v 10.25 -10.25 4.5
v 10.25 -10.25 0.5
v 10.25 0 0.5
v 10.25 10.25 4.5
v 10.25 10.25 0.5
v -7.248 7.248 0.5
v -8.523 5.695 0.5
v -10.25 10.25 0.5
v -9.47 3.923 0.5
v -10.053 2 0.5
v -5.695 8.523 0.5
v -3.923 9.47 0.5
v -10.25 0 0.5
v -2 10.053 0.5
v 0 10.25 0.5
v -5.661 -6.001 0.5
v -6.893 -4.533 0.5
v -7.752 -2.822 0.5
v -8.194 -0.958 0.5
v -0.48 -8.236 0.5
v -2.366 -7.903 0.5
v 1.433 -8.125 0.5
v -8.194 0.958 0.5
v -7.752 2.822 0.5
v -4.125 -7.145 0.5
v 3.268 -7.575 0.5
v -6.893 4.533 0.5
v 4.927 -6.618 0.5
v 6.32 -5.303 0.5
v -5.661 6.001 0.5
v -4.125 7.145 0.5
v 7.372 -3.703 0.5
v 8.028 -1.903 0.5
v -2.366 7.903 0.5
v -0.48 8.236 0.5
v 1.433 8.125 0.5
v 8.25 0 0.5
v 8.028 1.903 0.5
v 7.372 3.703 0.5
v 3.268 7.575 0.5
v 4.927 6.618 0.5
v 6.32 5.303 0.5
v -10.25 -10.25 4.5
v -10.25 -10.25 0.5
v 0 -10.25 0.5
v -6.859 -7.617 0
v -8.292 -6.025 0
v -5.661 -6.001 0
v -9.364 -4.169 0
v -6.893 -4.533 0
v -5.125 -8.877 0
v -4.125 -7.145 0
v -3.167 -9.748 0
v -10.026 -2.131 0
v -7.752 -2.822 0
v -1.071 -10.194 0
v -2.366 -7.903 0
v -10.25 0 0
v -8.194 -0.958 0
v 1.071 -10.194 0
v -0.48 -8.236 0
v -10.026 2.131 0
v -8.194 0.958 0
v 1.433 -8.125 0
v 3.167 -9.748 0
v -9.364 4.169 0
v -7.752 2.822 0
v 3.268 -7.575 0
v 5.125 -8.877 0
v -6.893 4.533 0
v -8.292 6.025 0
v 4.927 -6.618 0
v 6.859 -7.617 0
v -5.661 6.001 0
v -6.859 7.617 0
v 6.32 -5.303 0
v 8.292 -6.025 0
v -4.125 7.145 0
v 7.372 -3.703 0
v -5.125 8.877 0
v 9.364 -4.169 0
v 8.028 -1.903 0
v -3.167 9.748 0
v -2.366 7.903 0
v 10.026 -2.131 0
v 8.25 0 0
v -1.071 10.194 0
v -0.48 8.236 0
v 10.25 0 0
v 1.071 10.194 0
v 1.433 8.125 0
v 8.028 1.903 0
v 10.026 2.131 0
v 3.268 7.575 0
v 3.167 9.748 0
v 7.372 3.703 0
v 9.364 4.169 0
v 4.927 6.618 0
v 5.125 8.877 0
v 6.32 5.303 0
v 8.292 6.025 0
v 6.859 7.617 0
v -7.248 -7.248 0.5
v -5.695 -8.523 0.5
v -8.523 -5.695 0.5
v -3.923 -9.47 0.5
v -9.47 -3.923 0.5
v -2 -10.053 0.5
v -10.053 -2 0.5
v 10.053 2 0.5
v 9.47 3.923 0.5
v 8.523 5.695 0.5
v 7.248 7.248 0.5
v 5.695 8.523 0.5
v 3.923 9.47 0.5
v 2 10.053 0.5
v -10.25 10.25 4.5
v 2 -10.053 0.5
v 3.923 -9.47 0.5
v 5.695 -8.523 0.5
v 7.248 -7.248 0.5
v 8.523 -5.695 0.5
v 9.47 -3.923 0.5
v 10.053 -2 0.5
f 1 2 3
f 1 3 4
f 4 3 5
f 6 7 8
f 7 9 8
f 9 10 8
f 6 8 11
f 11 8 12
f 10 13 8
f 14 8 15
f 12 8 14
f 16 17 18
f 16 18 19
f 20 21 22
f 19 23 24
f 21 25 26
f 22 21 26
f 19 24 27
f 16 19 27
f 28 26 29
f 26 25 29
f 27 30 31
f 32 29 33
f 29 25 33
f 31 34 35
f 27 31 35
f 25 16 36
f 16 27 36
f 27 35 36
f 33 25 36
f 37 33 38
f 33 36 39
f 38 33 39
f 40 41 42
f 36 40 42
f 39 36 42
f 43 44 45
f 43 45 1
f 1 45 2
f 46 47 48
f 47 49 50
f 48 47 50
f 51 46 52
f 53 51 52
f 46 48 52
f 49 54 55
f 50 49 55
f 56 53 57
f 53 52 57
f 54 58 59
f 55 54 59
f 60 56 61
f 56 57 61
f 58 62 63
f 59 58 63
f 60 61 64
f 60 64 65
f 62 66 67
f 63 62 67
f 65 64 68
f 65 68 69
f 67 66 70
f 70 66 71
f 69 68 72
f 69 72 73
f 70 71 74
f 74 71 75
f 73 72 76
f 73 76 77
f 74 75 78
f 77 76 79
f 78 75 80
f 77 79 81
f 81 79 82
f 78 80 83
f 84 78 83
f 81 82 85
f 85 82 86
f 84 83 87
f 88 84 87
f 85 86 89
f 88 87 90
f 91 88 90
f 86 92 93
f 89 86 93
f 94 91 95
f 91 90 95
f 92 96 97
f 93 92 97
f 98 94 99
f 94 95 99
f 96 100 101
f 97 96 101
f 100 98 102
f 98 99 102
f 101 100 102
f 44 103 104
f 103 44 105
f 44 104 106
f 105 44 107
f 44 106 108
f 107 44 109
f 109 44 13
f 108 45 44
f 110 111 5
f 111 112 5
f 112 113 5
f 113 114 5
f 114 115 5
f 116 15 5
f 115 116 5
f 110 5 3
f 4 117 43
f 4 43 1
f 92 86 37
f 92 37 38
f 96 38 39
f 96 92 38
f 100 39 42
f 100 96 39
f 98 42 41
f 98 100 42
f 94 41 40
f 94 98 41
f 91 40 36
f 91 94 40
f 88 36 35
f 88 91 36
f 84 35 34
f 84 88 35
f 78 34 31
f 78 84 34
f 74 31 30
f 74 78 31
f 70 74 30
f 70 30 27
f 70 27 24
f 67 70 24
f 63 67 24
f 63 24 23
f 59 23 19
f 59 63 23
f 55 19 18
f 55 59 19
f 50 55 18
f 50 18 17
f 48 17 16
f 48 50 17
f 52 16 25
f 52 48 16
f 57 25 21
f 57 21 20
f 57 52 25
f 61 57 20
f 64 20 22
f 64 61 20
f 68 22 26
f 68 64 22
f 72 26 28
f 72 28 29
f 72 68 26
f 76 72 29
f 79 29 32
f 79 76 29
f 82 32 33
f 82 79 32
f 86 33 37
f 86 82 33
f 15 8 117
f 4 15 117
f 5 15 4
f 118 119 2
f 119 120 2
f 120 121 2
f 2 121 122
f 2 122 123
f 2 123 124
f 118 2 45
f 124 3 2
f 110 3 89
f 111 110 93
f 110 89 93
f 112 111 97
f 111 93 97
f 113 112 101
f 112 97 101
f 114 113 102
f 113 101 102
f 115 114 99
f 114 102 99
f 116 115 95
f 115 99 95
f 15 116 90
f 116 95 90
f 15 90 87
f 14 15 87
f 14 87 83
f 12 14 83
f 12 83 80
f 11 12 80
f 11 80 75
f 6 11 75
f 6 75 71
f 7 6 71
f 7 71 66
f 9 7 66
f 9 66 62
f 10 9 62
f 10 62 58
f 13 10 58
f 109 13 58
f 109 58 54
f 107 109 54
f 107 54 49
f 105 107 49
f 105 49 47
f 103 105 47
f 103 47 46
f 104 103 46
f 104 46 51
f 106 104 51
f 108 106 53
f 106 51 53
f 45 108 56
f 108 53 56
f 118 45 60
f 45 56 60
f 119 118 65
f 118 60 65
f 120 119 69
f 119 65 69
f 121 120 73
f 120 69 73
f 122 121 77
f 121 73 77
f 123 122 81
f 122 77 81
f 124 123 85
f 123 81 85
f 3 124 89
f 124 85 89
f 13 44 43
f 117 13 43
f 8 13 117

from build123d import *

# Parameters (mm, degrees)
F0_R     = 10.25
F0_R_2   = 8.25
F1_DEPTH = 0.5
F2_W     = 20.5
F2_H     = 20.5
F3_DEPTH = 4


with BuildPart() as f1:
    # F0 (on Top) → F1 (new body)
    with BuildSketch(Plane.XY):
        Circle(F0_R)
        Circle(F0_R_2, mode=Mode.SUBTRACT)
    extrude(amount=F1_DEPTH)

    # F2 (on face) → F3 (join)
    with BuildSketch(Plane.XY.offset(0.5)):
        Rectangle(F2_W, F2_H)
    extrude(amount=F3_DEPTH)


solid = f1.part
